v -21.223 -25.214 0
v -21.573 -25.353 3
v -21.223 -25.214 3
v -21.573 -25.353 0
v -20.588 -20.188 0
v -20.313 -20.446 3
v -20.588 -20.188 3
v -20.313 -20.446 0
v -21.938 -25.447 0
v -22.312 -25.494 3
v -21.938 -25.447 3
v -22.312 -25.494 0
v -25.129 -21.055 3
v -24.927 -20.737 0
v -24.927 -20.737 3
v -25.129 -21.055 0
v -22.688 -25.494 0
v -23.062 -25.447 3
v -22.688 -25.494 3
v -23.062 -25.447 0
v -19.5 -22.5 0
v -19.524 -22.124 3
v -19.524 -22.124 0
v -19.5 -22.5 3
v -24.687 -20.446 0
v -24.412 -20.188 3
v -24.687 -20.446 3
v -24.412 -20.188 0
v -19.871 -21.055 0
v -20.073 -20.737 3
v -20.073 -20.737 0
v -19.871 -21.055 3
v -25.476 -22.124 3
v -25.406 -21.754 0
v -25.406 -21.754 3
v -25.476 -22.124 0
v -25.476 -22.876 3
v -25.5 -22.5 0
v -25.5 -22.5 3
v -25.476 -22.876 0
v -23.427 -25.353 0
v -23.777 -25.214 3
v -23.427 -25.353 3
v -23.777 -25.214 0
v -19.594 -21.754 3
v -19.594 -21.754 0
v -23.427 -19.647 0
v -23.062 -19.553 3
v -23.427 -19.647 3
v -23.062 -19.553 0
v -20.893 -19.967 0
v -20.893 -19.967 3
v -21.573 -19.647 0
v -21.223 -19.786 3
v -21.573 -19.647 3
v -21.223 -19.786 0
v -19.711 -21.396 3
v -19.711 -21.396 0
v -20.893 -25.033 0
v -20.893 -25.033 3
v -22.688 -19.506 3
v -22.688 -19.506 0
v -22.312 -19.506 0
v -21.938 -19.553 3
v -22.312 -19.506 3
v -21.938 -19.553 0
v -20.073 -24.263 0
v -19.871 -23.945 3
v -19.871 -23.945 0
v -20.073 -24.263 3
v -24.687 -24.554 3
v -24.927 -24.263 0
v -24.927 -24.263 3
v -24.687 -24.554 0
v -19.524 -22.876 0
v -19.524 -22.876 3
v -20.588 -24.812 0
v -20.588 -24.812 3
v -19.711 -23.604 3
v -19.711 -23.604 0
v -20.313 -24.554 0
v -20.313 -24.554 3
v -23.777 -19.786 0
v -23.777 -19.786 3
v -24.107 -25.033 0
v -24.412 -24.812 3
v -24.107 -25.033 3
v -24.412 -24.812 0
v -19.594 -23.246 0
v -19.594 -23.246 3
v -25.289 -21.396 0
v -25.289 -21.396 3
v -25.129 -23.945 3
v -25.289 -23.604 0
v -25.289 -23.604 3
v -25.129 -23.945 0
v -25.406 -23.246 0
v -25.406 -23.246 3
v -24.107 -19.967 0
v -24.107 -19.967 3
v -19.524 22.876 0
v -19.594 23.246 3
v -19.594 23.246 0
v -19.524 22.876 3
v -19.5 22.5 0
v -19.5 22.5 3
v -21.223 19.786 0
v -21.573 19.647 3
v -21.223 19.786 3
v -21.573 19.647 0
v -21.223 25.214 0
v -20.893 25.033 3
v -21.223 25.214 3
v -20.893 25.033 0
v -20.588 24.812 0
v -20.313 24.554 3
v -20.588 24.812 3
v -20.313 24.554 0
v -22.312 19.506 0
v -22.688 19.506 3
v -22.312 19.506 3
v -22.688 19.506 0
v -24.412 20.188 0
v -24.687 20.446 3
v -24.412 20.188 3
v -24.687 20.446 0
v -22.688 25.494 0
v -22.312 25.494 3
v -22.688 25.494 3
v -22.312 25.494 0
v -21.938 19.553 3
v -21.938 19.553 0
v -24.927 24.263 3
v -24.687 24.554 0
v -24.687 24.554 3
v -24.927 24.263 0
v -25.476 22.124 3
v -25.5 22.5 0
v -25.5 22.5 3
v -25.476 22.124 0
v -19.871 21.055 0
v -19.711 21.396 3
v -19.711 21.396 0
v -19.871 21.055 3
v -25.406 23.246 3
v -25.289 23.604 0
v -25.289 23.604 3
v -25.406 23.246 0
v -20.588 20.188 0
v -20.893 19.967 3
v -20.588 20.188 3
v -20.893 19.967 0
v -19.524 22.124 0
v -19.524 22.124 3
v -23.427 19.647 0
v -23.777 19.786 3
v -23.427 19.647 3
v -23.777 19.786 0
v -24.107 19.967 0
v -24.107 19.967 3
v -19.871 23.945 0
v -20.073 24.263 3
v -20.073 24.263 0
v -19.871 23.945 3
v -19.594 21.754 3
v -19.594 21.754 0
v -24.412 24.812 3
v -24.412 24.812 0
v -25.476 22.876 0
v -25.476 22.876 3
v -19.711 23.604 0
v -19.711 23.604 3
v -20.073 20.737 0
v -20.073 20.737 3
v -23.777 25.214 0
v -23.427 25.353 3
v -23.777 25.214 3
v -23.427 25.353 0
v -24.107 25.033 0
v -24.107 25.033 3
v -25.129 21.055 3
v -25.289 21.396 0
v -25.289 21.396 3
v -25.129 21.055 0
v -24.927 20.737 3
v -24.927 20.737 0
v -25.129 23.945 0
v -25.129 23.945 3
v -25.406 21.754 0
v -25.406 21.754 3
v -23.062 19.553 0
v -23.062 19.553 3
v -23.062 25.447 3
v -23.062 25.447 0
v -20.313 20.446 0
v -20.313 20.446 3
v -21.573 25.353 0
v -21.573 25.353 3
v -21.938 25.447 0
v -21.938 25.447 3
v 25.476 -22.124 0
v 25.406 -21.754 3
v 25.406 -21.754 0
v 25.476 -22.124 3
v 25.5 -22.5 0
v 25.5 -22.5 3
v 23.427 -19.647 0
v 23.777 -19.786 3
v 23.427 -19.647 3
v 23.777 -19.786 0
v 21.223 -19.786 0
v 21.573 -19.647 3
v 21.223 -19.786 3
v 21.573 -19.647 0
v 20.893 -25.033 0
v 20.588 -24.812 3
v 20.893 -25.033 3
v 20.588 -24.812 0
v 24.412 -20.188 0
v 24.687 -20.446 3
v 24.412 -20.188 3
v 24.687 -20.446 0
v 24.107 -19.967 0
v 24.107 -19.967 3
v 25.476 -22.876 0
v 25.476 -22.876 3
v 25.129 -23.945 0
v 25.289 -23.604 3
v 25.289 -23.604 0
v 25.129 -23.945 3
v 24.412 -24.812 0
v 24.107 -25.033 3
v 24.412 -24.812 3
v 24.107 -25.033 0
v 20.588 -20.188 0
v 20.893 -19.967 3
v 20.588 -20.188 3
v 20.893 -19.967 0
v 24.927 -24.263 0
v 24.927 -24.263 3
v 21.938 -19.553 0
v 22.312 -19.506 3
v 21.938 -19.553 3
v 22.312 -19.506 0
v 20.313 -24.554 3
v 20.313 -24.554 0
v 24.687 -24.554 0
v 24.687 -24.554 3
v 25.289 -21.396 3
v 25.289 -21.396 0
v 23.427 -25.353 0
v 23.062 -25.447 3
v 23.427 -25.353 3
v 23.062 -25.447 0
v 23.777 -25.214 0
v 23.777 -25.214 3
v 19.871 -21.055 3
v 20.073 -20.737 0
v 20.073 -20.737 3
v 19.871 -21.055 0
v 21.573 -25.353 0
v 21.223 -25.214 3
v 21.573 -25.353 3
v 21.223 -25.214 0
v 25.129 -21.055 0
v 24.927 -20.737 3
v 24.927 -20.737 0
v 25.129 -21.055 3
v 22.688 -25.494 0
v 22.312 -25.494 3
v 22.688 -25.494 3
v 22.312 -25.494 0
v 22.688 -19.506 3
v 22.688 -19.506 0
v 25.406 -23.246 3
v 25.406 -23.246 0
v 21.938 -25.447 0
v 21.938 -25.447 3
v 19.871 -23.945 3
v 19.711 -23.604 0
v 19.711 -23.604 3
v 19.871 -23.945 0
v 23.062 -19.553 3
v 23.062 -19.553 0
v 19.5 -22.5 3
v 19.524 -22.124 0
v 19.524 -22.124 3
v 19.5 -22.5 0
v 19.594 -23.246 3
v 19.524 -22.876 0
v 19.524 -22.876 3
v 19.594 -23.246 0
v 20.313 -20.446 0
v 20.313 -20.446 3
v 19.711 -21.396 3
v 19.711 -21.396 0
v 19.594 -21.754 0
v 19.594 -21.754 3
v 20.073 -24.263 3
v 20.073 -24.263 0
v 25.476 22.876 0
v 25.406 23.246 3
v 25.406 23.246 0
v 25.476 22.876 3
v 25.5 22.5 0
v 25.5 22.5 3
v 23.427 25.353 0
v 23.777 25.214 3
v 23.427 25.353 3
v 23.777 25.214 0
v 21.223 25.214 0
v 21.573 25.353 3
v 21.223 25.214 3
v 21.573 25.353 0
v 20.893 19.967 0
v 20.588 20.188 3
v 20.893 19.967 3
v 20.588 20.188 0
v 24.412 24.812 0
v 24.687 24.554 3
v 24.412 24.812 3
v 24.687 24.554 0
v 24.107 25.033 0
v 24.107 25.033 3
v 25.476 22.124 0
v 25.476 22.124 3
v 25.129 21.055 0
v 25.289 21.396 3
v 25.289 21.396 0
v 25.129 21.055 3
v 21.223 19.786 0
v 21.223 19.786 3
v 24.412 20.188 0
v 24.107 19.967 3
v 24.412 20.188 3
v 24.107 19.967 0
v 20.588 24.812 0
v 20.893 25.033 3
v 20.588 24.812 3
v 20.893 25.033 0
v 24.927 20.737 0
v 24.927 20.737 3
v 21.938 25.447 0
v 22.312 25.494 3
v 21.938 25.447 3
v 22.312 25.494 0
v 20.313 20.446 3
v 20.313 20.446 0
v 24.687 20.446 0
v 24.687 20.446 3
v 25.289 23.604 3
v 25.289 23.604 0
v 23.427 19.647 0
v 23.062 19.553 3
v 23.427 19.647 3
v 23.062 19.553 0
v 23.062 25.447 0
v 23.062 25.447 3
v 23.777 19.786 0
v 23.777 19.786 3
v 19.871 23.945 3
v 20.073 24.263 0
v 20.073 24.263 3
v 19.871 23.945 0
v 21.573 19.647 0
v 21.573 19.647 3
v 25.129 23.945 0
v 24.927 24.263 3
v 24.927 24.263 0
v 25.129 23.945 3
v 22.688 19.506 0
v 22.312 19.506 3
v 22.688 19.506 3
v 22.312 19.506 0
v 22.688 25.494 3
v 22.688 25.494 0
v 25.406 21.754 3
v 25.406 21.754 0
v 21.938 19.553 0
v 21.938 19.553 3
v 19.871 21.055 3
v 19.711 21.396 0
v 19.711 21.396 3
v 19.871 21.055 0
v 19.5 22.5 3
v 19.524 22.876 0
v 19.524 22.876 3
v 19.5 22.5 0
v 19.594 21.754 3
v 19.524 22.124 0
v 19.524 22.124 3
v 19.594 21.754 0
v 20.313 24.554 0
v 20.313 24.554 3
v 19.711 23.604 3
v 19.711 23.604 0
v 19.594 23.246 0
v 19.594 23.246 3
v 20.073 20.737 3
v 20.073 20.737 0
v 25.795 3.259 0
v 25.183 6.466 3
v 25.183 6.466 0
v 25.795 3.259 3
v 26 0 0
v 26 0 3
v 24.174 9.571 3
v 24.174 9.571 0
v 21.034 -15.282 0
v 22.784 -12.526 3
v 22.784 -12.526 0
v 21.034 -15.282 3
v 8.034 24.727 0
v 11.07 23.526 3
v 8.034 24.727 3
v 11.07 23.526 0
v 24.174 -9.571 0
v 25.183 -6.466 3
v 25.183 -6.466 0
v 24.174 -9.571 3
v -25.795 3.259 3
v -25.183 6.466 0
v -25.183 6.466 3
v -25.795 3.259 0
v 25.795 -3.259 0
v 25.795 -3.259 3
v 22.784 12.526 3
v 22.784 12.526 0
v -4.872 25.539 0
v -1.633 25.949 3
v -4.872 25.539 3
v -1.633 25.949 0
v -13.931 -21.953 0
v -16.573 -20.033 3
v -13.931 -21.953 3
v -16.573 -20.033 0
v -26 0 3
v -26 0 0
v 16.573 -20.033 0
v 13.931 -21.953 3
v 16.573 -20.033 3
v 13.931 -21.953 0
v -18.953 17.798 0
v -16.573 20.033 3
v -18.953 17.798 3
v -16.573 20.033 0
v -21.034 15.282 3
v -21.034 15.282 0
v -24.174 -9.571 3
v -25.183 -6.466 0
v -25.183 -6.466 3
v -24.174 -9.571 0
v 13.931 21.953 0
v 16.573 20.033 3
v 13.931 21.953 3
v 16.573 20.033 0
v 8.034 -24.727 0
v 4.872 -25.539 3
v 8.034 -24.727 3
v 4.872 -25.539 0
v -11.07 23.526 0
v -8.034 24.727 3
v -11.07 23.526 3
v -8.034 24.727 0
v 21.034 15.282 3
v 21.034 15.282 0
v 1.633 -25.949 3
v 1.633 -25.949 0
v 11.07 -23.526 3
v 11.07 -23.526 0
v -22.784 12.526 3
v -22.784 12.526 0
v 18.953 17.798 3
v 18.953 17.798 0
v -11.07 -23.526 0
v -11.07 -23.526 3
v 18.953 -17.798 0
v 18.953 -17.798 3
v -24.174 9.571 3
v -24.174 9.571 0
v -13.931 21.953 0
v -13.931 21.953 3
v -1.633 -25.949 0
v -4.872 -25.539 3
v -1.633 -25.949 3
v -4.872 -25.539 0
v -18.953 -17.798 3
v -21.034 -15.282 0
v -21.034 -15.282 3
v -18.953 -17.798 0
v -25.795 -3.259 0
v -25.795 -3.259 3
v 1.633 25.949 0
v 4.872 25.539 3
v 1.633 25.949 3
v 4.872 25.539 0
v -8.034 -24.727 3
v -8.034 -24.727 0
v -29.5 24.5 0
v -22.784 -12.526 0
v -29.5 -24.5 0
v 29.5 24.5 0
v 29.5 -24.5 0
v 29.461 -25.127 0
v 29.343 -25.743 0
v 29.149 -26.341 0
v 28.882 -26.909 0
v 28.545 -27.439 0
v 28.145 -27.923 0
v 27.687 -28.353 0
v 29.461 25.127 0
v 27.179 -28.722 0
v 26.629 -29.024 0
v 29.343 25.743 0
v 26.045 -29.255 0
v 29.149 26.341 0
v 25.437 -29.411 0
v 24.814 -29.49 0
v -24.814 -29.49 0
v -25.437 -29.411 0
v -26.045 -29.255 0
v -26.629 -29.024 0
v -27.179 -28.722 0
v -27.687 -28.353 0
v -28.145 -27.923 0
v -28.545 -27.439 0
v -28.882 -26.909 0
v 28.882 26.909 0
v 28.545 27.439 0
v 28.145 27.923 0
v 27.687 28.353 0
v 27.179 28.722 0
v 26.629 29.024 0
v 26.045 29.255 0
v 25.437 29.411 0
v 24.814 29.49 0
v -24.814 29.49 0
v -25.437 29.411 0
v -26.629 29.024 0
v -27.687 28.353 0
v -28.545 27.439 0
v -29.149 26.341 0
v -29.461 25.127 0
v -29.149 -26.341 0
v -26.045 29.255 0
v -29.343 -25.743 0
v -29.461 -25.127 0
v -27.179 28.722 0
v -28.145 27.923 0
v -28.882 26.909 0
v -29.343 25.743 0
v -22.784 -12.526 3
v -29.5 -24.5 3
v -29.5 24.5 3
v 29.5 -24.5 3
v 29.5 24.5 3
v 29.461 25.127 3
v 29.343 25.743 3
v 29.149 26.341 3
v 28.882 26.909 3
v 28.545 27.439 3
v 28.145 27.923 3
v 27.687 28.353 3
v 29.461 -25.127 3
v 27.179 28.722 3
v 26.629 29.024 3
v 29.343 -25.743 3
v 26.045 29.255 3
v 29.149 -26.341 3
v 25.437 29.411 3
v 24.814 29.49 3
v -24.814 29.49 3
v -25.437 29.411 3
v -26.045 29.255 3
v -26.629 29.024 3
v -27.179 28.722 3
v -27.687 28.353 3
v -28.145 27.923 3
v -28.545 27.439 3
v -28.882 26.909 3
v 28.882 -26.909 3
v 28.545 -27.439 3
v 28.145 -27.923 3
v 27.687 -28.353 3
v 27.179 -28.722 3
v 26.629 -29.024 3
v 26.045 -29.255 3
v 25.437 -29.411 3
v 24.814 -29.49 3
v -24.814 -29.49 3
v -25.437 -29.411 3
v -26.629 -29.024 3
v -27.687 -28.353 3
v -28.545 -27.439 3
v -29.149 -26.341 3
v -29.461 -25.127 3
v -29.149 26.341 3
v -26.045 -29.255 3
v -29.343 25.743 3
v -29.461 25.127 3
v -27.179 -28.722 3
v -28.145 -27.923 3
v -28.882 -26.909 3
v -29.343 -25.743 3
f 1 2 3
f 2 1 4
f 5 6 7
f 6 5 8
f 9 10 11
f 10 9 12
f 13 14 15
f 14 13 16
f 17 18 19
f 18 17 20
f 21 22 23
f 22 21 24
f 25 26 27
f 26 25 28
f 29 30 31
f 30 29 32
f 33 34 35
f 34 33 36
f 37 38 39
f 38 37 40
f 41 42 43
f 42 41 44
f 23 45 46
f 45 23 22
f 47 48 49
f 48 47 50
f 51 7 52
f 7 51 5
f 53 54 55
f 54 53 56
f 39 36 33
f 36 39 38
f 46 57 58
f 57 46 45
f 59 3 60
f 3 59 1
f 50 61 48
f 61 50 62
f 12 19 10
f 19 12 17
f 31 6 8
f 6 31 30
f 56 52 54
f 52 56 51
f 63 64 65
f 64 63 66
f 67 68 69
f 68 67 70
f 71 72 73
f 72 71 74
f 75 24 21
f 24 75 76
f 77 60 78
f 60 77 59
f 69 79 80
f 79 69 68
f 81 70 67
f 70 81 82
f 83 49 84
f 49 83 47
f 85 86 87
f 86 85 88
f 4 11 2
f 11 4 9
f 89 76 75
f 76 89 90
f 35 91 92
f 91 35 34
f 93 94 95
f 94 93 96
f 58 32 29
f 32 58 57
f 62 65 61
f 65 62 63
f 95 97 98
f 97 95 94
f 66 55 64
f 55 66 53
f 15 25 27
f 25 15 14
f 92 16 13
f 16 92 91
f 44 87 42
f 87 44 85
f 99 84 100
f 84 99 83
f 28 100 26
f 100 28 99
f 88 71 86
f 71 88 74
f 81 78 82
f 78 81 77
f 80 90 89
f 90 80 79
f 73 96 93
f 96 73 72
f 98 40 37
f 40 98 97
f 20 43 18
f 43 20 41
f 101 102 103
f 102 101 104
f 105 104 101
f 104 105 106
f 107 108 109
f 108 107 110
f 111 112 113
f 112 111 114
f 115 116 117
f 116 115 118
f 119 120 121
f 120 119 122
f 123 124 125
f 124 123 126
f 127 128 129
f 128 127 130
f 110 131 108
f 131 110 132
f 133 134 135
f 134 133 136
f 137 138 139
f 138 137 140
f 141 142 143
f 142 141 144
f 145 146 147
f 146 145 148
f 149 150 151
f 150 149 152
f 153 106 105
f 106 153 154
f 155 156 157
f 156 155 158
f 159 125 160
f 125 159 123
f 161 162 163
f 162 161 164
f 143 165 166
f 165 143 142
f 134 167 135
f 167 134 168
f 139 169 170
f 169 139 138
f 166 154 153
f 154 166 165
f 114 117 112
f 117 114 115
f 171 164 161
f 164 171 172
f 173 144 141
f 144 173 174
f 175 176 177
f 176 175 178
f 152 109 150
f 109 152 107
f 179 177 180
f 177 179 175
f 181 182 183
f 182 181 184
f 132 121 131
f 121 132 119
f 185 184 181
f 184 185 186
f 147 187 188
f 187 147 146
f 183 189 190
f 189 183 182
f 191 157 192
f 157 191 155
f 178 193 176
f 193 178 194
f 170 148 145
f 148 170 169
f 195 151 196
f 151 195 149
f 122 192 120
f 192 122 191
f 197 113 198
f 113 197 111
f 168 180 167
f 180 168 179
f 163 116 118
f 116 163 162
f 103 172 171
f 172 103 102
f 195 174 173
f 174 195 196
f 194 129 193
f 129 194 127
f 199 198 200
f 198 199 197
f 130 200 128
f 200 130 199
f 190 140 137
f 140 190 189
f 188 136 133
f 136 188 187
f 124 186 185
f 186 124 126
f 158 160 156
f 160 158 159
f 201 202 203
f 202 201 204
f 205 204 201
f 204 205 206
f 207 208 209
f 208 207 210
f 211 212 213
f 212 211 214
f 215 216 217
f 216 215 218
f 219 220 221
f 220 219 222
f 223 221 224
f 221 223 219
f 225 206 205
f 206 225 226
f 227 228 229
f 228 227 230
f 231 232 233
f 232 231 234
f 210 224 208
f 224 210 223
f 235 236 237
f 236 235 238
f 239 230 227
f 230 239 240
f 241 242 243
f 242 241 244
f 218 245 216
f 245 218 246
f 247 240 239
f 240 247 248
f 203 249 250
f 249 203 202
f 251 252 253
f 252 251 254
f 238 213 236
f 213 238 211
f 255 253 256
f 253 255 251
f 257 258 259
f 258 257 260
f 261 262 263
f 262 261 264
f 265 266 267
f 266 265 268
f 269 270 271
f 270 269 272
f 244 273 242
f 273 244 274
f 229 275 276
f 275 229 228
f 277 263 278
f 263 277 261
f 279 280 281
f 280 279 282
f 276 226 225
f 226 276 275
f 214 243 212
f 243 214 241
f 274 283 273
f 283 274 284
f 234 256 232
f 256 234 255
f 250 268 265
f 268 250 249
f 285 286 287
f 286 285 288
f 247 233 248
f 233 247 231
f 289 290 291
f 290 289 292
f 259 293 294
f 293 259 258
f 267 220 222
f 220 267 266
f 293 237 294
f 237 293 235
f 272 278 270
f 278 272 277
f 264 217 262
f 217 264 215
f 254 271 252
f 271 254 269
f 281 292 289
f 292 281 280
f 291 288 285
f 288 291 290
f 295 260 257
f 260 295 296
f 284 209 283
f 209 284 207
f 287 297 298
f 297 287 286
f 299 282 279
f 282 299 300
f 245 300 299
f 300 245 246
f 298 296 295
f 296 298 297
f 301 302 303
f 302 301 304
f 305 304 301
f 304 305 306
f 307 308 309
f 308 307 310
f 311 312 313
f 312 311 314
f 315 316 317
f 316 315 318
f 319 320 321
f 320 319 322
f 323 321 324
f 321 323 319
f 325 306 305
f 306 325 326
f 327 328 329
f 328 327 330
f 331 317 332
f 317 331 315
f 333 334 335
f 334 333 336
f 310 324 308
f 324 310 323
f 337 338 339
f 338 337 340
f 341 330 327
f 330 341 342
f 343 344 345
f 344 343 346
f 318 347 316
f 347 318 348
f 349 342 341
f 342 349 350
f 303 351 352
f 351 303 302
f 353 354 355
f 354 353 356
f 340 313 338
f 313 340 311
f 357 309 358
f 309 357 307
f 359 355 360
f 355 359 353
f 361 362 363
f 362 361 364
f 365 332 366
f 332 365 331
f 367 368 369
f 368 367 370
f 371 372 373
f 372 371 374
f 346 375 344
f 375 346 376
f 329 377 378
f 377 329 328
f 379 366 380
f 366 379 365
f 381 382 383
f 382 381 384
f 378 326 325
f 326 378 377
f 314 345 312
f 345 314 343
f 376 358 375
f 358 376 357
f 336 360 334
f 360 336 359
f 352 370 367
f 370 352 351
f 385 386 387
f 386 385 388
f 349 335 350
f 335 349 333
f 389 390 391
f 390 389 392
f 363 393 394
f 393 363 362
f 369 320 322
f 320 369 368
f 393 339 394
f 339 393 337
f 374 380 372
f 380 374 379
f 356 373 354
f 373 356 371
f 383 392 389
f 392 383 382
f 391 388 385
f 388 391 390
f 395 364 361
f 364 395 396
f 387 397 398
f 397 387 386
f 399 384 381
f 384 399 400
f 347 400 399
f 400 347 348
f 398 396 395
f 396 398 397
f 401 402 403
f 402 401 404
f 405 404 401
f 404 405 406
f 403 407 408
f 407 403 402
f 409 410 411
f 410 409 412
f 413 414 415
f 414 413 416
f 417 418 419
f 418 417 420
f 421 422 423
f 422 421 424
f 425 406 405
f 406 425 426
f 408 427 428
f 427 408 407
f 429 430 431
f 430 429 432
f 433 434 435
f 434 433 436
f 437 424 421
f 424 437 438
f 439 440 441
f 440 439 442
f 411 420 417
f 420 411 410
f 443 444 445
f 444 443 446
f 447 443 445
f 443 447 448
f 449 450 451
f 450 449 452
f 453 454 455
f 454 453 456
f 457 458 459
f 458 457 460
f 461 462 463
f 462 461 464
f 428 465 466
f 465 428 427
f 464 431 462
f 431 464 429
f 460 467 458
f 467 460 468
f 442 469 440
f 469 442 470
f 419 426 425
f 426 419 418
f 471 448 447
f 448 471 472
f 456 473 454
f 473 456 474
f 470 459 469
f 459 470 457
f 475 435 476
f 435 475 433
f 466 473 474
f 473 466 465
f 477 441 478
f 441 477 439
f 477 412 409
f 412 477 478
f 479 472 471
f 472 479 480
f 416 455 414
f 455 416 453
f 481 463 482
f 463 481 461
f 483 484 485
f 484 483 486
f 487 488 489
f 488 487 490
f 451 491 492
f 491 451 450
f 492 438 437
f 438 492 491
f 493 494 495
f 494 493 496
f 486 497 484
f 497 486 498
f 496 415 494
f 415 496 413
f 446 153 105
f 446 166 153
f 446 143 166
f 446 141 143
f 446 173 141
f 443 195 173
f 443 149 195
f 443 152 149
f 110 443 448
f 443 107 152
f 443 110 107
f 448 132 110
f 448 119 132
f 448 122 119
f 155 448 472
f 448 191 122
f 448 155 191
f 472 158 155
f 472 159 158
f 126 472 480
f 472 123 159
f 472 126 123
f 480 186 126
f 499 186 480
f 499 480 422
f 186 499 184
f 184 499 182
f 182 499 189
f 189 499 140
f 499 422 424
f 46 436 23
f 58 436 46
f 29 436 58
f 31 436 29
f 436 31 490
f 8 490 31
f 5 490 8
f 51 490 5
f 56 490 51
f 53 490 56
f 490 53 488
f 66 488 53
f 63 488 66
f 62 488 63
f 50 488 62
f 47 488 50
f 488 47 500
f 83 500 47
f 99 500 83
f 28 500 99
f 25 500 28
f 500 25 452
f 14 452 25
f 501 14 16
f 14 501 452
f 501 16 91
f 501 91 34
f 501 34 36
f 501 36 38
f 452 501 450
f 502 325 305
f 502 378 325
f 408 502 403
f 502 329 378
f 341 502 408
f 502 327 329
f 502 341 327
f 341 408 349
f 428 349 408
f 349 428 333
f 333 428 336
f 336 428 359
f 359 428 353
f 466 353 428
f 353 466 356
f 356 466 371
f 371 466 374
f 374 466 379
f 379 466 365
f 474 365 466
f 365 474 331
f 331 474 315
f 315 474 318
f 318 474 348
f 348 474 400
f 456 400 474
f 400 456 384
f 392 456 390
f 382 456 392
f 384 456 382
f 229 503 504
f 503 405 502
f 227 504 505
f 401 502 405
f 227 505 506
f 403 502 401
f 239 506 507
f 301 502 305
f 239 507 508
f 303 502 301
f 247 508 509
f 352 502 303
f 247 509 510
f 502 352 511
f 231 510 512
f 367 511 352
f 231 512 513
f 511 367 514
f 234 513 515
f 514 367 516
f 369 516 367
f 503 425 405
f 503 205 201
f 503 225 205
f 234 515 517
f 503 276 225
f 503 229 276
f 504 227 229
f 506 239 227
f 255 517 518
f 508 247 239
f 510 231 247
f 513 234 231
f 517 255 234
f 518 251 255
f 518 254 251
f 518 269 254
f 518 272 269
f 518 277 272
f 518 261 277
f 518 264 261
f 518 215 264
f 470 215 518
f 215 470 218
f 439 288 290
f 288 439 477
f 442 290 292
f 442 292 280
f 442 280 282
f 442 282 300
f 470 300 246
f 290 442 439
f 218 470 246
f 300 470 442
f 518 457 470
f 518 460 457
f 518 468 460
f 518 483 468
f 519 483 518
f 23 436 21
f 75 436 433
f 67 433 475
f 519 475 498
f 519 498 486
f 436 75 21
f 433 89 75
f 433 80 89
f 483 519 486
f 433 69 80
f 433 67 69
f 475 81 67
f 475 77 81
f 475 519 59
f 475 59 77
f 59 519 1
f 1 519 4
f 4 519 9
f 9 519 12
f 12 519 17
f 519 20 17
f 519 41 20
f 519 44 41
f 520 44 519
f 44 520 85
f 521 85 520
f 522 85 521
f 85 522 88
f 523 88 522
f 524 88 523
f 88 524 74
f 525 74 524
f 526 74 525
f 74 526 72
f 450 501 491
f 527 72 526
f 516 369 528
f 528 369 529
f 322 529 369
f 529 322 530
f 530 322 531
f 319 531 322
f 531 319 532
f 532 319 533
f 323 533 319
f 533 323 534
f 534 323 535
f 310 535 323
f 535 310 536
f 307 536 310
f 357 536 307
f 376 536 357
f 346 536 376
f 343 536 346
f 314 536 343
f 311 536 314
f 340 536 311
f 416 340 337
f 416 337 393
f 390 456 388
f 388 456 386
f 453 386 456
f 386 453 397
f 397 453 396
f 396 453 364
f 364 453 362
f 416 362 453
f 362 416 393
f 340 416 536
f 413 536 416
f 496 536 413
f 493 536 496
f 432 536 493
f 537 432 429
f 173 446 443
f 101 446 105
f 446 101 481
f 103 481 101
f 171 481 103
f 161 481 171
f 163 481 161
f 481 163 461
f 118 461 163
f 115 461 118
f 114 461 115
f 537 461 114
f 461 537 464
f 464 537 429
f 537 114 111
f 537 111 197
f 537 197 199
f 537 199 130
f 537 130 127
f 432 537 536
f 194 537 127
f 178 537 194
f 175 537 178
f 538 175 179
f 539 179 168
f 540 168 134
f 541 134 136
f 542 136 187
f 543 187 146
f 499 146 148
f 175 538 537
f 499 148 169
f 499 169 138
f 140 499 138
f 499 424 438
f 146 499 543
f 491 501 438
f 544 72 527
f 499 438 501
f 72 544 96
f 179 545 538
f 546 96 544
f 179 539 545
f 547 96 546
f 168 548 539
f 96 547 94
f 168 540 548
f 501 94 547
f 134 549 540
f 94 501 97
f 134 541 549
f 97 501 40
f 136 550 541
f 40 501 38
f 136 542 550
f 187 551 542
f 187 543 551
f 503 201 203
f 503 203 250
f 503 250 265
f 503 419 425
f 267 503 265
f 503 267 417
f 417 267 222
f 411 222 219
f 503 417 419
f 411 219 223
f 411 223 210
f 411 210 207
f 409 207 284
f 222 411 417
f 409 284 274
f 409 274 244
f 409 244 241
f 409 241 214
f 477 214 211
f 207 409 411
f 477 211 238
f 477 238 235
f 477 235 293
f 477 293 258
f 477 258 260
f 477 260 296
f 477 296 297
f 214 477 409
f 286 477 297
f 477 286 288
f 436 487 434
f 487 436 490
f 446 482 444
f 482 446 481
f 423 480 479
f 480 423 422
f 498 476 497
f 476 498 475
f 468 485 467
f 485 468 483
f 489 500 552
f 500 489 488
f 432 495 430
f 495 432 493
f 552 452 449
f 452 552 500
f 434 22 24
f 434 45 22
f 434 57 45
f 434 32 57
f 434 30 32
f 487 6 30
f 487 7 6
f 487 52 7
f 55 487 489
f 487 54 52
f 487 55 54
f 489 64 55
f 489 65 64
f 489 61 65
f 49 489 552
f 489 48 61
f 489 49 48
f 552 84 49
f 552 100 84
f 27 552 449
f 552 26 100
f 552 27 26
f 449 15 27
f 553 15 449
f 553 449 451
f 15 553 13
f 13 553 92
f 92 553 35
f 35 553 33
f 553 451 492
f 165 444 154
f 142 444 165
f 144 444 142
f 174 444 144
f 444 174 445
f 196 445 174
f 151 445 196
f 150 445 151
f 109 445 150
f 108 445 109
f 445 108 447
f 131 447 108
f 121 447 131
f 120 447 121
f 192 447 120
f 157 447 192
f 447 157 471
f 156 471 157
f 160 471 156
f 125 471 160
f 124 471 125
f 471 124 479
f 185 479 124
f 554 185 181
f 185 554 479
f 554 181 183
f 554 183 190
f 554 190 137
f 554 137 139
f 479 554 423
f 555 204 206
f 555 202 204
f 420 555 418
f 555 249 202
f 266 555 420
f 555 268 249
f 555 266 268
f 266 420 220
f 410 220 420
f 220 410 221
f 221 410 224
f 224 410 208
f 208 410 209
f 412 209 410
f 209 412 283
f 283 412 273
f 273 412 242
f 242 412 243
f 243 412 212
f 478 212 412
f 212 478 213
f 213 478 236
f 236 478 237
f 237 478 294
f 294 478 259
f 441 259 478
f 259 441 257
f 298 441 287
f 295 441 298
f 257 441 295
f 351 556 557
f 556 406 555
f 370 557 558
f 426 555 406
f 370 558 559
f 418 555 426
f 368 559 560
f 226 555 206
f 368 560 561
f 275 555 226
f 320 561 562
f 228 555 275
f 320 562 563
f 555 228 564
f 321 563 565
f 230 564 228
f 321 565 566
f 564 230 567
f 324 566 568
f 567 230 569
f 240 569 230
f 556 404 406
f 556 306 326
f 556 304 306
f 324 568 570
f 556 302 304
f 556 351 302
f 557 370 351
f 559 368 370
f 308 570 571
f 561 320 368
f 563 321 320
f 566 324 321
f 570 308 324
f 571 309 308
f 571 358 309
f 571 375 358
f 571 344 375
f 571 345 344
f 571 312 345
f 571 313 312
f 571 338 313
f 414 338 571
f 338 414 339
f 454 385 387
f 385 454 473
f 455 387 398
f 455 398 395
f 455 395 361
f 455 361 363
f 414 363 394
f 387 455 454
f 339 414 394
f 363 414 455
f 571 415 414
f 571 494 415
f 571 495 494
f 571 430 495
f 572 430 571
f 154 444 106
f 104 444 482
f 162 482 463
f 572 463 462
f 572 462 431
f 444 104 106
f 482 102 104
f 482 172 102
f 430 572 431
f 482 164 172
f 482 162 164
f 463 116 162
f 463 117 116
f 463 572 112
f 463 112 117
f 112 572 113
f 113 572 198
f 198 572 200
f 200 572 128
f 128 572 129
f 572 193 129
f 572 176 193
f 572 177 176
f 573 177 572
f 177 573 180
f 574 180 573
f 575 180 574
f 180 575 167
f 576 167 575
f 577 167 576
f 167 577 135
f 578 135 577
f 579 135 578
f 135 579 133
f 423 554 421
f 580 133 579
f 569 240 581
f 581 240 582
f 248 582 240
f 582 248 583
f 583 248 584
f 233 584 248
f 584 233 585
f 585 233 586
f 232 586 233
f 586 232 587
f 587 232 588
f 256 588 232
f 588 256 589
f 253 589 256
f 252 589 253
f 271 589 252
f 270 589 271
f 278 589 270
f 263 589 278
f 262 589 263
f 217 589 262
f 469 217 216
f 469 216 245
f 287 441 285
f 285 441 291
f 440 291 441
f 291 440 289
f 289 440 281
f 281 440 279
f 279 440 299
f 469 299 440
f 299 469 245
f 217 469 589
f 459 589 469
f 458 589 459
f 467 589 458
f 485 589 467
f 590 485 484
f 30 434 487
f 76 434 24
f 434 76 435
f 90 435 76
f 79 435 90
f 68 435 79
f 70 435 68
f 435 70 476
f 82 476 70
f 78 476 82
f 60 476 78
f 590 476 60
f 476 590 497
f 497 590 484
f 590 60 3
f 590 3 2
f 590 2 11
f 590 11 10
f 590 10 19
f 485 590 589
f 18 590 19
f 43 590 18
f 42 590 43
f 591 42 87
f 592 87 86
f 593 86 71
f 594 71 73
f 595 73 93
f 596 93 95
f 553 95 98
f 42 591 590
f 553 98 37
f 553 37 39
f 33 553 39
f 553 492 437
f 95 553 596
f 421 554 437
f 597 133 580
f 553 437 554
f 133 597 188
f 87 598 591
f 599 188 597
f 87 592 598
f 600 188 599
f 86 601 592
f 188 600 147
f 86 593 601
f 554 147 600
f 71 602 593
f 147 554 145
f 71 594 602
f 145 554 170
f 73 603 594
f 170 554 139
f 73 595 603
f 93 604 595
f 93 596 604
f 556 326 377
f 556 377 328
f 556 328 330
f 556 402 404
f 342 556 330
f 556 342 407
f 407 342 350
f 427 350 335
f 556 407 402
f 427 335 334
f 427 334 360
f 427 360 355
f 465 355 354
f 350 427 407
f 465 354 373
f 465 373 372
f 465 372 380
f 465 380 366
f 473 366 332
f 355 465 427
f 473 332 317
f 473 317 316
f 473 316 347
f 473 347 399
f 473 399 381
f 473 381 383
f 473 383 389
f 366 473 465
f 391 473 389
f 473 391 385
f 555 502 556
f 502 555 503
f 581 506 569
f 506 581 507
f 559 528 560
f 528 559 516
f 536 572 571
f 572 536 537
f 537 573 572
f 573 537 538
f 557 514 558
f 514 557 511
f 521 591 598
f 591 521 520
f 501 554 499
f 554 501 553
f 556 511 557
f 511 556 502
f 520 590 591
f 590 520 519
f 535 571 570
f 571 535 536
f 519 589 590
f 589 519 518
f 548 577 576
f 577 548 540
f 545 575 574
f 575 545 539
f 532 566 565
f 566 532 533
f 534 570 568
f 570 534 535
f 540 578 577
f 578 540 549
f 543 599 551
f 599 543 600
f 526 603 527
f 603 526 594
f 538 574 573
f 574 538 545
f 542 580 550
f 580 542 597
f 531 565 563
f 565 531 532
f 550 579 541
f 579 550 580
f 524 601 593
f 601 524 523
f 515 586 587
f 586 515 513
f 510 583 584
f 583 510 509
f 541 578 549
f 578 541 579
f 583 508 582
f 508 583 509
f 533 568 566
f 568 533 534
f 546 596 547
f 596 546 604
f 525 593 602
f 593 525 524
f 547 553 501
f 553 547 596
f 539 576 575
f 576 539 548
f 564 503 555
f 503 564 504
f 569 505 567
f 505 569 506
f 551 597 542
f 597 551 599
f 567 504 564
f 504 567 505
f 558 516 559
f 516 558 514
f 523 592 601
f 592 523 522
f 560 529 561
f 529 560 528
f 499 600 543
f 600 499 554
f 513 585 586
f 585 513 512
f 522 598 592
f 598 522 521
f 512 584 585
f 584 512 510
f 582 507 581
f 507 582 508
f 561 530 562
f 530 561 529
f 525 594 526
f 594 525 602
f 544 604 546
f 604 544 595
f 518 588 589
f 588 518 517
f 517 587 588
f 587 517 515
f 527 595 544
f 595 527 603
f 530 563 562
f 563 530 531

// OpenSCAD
$fn = 50;


difference() {
	union() {
		hull() {
			translate(v = [-24.5000000000, 24.5000000000, 0]) {
				cylinder(h = 3, r = 5);
			}
			translate(v = [24.5000000000, 24.5000000000, 0]) {
				cylinder(h = 3, r = 5);
			}
			translate(v = [-24.5000000000, -24.5000000000, 0]) {
				cylinder(h = 3, r = 5);
			}
			translate(v = [24.5000000000, -24.5000000000, 0]) {
				cylinder(h = 3, r = 5);
			}
		}
	}
	union() {
		#translate(v = [-22.5000000000, -22.5000000000, -100.0000000000]) {
			cylinder(h = 200, r = 3.0000000000);
		}
		#translate(v = [-22.5000000000, 22.5000000000, -100.0000000000]) {
			cylinder(h = 200, r = 3.0000000000);
		}
		#translate(v = [22.5000000000, -22.5000000000, -100.0000000000]) {
			cylinder(h = 200, r = 3.0000000000);
		}
		#translate(v = [22.5000000000, 22.5000000000, -100.0000000000]) {
			cylinder(h = 200, r = 3.0000000000);
		}
		#cylinder(h = 3, r = 26.0000000000);
	}
}
